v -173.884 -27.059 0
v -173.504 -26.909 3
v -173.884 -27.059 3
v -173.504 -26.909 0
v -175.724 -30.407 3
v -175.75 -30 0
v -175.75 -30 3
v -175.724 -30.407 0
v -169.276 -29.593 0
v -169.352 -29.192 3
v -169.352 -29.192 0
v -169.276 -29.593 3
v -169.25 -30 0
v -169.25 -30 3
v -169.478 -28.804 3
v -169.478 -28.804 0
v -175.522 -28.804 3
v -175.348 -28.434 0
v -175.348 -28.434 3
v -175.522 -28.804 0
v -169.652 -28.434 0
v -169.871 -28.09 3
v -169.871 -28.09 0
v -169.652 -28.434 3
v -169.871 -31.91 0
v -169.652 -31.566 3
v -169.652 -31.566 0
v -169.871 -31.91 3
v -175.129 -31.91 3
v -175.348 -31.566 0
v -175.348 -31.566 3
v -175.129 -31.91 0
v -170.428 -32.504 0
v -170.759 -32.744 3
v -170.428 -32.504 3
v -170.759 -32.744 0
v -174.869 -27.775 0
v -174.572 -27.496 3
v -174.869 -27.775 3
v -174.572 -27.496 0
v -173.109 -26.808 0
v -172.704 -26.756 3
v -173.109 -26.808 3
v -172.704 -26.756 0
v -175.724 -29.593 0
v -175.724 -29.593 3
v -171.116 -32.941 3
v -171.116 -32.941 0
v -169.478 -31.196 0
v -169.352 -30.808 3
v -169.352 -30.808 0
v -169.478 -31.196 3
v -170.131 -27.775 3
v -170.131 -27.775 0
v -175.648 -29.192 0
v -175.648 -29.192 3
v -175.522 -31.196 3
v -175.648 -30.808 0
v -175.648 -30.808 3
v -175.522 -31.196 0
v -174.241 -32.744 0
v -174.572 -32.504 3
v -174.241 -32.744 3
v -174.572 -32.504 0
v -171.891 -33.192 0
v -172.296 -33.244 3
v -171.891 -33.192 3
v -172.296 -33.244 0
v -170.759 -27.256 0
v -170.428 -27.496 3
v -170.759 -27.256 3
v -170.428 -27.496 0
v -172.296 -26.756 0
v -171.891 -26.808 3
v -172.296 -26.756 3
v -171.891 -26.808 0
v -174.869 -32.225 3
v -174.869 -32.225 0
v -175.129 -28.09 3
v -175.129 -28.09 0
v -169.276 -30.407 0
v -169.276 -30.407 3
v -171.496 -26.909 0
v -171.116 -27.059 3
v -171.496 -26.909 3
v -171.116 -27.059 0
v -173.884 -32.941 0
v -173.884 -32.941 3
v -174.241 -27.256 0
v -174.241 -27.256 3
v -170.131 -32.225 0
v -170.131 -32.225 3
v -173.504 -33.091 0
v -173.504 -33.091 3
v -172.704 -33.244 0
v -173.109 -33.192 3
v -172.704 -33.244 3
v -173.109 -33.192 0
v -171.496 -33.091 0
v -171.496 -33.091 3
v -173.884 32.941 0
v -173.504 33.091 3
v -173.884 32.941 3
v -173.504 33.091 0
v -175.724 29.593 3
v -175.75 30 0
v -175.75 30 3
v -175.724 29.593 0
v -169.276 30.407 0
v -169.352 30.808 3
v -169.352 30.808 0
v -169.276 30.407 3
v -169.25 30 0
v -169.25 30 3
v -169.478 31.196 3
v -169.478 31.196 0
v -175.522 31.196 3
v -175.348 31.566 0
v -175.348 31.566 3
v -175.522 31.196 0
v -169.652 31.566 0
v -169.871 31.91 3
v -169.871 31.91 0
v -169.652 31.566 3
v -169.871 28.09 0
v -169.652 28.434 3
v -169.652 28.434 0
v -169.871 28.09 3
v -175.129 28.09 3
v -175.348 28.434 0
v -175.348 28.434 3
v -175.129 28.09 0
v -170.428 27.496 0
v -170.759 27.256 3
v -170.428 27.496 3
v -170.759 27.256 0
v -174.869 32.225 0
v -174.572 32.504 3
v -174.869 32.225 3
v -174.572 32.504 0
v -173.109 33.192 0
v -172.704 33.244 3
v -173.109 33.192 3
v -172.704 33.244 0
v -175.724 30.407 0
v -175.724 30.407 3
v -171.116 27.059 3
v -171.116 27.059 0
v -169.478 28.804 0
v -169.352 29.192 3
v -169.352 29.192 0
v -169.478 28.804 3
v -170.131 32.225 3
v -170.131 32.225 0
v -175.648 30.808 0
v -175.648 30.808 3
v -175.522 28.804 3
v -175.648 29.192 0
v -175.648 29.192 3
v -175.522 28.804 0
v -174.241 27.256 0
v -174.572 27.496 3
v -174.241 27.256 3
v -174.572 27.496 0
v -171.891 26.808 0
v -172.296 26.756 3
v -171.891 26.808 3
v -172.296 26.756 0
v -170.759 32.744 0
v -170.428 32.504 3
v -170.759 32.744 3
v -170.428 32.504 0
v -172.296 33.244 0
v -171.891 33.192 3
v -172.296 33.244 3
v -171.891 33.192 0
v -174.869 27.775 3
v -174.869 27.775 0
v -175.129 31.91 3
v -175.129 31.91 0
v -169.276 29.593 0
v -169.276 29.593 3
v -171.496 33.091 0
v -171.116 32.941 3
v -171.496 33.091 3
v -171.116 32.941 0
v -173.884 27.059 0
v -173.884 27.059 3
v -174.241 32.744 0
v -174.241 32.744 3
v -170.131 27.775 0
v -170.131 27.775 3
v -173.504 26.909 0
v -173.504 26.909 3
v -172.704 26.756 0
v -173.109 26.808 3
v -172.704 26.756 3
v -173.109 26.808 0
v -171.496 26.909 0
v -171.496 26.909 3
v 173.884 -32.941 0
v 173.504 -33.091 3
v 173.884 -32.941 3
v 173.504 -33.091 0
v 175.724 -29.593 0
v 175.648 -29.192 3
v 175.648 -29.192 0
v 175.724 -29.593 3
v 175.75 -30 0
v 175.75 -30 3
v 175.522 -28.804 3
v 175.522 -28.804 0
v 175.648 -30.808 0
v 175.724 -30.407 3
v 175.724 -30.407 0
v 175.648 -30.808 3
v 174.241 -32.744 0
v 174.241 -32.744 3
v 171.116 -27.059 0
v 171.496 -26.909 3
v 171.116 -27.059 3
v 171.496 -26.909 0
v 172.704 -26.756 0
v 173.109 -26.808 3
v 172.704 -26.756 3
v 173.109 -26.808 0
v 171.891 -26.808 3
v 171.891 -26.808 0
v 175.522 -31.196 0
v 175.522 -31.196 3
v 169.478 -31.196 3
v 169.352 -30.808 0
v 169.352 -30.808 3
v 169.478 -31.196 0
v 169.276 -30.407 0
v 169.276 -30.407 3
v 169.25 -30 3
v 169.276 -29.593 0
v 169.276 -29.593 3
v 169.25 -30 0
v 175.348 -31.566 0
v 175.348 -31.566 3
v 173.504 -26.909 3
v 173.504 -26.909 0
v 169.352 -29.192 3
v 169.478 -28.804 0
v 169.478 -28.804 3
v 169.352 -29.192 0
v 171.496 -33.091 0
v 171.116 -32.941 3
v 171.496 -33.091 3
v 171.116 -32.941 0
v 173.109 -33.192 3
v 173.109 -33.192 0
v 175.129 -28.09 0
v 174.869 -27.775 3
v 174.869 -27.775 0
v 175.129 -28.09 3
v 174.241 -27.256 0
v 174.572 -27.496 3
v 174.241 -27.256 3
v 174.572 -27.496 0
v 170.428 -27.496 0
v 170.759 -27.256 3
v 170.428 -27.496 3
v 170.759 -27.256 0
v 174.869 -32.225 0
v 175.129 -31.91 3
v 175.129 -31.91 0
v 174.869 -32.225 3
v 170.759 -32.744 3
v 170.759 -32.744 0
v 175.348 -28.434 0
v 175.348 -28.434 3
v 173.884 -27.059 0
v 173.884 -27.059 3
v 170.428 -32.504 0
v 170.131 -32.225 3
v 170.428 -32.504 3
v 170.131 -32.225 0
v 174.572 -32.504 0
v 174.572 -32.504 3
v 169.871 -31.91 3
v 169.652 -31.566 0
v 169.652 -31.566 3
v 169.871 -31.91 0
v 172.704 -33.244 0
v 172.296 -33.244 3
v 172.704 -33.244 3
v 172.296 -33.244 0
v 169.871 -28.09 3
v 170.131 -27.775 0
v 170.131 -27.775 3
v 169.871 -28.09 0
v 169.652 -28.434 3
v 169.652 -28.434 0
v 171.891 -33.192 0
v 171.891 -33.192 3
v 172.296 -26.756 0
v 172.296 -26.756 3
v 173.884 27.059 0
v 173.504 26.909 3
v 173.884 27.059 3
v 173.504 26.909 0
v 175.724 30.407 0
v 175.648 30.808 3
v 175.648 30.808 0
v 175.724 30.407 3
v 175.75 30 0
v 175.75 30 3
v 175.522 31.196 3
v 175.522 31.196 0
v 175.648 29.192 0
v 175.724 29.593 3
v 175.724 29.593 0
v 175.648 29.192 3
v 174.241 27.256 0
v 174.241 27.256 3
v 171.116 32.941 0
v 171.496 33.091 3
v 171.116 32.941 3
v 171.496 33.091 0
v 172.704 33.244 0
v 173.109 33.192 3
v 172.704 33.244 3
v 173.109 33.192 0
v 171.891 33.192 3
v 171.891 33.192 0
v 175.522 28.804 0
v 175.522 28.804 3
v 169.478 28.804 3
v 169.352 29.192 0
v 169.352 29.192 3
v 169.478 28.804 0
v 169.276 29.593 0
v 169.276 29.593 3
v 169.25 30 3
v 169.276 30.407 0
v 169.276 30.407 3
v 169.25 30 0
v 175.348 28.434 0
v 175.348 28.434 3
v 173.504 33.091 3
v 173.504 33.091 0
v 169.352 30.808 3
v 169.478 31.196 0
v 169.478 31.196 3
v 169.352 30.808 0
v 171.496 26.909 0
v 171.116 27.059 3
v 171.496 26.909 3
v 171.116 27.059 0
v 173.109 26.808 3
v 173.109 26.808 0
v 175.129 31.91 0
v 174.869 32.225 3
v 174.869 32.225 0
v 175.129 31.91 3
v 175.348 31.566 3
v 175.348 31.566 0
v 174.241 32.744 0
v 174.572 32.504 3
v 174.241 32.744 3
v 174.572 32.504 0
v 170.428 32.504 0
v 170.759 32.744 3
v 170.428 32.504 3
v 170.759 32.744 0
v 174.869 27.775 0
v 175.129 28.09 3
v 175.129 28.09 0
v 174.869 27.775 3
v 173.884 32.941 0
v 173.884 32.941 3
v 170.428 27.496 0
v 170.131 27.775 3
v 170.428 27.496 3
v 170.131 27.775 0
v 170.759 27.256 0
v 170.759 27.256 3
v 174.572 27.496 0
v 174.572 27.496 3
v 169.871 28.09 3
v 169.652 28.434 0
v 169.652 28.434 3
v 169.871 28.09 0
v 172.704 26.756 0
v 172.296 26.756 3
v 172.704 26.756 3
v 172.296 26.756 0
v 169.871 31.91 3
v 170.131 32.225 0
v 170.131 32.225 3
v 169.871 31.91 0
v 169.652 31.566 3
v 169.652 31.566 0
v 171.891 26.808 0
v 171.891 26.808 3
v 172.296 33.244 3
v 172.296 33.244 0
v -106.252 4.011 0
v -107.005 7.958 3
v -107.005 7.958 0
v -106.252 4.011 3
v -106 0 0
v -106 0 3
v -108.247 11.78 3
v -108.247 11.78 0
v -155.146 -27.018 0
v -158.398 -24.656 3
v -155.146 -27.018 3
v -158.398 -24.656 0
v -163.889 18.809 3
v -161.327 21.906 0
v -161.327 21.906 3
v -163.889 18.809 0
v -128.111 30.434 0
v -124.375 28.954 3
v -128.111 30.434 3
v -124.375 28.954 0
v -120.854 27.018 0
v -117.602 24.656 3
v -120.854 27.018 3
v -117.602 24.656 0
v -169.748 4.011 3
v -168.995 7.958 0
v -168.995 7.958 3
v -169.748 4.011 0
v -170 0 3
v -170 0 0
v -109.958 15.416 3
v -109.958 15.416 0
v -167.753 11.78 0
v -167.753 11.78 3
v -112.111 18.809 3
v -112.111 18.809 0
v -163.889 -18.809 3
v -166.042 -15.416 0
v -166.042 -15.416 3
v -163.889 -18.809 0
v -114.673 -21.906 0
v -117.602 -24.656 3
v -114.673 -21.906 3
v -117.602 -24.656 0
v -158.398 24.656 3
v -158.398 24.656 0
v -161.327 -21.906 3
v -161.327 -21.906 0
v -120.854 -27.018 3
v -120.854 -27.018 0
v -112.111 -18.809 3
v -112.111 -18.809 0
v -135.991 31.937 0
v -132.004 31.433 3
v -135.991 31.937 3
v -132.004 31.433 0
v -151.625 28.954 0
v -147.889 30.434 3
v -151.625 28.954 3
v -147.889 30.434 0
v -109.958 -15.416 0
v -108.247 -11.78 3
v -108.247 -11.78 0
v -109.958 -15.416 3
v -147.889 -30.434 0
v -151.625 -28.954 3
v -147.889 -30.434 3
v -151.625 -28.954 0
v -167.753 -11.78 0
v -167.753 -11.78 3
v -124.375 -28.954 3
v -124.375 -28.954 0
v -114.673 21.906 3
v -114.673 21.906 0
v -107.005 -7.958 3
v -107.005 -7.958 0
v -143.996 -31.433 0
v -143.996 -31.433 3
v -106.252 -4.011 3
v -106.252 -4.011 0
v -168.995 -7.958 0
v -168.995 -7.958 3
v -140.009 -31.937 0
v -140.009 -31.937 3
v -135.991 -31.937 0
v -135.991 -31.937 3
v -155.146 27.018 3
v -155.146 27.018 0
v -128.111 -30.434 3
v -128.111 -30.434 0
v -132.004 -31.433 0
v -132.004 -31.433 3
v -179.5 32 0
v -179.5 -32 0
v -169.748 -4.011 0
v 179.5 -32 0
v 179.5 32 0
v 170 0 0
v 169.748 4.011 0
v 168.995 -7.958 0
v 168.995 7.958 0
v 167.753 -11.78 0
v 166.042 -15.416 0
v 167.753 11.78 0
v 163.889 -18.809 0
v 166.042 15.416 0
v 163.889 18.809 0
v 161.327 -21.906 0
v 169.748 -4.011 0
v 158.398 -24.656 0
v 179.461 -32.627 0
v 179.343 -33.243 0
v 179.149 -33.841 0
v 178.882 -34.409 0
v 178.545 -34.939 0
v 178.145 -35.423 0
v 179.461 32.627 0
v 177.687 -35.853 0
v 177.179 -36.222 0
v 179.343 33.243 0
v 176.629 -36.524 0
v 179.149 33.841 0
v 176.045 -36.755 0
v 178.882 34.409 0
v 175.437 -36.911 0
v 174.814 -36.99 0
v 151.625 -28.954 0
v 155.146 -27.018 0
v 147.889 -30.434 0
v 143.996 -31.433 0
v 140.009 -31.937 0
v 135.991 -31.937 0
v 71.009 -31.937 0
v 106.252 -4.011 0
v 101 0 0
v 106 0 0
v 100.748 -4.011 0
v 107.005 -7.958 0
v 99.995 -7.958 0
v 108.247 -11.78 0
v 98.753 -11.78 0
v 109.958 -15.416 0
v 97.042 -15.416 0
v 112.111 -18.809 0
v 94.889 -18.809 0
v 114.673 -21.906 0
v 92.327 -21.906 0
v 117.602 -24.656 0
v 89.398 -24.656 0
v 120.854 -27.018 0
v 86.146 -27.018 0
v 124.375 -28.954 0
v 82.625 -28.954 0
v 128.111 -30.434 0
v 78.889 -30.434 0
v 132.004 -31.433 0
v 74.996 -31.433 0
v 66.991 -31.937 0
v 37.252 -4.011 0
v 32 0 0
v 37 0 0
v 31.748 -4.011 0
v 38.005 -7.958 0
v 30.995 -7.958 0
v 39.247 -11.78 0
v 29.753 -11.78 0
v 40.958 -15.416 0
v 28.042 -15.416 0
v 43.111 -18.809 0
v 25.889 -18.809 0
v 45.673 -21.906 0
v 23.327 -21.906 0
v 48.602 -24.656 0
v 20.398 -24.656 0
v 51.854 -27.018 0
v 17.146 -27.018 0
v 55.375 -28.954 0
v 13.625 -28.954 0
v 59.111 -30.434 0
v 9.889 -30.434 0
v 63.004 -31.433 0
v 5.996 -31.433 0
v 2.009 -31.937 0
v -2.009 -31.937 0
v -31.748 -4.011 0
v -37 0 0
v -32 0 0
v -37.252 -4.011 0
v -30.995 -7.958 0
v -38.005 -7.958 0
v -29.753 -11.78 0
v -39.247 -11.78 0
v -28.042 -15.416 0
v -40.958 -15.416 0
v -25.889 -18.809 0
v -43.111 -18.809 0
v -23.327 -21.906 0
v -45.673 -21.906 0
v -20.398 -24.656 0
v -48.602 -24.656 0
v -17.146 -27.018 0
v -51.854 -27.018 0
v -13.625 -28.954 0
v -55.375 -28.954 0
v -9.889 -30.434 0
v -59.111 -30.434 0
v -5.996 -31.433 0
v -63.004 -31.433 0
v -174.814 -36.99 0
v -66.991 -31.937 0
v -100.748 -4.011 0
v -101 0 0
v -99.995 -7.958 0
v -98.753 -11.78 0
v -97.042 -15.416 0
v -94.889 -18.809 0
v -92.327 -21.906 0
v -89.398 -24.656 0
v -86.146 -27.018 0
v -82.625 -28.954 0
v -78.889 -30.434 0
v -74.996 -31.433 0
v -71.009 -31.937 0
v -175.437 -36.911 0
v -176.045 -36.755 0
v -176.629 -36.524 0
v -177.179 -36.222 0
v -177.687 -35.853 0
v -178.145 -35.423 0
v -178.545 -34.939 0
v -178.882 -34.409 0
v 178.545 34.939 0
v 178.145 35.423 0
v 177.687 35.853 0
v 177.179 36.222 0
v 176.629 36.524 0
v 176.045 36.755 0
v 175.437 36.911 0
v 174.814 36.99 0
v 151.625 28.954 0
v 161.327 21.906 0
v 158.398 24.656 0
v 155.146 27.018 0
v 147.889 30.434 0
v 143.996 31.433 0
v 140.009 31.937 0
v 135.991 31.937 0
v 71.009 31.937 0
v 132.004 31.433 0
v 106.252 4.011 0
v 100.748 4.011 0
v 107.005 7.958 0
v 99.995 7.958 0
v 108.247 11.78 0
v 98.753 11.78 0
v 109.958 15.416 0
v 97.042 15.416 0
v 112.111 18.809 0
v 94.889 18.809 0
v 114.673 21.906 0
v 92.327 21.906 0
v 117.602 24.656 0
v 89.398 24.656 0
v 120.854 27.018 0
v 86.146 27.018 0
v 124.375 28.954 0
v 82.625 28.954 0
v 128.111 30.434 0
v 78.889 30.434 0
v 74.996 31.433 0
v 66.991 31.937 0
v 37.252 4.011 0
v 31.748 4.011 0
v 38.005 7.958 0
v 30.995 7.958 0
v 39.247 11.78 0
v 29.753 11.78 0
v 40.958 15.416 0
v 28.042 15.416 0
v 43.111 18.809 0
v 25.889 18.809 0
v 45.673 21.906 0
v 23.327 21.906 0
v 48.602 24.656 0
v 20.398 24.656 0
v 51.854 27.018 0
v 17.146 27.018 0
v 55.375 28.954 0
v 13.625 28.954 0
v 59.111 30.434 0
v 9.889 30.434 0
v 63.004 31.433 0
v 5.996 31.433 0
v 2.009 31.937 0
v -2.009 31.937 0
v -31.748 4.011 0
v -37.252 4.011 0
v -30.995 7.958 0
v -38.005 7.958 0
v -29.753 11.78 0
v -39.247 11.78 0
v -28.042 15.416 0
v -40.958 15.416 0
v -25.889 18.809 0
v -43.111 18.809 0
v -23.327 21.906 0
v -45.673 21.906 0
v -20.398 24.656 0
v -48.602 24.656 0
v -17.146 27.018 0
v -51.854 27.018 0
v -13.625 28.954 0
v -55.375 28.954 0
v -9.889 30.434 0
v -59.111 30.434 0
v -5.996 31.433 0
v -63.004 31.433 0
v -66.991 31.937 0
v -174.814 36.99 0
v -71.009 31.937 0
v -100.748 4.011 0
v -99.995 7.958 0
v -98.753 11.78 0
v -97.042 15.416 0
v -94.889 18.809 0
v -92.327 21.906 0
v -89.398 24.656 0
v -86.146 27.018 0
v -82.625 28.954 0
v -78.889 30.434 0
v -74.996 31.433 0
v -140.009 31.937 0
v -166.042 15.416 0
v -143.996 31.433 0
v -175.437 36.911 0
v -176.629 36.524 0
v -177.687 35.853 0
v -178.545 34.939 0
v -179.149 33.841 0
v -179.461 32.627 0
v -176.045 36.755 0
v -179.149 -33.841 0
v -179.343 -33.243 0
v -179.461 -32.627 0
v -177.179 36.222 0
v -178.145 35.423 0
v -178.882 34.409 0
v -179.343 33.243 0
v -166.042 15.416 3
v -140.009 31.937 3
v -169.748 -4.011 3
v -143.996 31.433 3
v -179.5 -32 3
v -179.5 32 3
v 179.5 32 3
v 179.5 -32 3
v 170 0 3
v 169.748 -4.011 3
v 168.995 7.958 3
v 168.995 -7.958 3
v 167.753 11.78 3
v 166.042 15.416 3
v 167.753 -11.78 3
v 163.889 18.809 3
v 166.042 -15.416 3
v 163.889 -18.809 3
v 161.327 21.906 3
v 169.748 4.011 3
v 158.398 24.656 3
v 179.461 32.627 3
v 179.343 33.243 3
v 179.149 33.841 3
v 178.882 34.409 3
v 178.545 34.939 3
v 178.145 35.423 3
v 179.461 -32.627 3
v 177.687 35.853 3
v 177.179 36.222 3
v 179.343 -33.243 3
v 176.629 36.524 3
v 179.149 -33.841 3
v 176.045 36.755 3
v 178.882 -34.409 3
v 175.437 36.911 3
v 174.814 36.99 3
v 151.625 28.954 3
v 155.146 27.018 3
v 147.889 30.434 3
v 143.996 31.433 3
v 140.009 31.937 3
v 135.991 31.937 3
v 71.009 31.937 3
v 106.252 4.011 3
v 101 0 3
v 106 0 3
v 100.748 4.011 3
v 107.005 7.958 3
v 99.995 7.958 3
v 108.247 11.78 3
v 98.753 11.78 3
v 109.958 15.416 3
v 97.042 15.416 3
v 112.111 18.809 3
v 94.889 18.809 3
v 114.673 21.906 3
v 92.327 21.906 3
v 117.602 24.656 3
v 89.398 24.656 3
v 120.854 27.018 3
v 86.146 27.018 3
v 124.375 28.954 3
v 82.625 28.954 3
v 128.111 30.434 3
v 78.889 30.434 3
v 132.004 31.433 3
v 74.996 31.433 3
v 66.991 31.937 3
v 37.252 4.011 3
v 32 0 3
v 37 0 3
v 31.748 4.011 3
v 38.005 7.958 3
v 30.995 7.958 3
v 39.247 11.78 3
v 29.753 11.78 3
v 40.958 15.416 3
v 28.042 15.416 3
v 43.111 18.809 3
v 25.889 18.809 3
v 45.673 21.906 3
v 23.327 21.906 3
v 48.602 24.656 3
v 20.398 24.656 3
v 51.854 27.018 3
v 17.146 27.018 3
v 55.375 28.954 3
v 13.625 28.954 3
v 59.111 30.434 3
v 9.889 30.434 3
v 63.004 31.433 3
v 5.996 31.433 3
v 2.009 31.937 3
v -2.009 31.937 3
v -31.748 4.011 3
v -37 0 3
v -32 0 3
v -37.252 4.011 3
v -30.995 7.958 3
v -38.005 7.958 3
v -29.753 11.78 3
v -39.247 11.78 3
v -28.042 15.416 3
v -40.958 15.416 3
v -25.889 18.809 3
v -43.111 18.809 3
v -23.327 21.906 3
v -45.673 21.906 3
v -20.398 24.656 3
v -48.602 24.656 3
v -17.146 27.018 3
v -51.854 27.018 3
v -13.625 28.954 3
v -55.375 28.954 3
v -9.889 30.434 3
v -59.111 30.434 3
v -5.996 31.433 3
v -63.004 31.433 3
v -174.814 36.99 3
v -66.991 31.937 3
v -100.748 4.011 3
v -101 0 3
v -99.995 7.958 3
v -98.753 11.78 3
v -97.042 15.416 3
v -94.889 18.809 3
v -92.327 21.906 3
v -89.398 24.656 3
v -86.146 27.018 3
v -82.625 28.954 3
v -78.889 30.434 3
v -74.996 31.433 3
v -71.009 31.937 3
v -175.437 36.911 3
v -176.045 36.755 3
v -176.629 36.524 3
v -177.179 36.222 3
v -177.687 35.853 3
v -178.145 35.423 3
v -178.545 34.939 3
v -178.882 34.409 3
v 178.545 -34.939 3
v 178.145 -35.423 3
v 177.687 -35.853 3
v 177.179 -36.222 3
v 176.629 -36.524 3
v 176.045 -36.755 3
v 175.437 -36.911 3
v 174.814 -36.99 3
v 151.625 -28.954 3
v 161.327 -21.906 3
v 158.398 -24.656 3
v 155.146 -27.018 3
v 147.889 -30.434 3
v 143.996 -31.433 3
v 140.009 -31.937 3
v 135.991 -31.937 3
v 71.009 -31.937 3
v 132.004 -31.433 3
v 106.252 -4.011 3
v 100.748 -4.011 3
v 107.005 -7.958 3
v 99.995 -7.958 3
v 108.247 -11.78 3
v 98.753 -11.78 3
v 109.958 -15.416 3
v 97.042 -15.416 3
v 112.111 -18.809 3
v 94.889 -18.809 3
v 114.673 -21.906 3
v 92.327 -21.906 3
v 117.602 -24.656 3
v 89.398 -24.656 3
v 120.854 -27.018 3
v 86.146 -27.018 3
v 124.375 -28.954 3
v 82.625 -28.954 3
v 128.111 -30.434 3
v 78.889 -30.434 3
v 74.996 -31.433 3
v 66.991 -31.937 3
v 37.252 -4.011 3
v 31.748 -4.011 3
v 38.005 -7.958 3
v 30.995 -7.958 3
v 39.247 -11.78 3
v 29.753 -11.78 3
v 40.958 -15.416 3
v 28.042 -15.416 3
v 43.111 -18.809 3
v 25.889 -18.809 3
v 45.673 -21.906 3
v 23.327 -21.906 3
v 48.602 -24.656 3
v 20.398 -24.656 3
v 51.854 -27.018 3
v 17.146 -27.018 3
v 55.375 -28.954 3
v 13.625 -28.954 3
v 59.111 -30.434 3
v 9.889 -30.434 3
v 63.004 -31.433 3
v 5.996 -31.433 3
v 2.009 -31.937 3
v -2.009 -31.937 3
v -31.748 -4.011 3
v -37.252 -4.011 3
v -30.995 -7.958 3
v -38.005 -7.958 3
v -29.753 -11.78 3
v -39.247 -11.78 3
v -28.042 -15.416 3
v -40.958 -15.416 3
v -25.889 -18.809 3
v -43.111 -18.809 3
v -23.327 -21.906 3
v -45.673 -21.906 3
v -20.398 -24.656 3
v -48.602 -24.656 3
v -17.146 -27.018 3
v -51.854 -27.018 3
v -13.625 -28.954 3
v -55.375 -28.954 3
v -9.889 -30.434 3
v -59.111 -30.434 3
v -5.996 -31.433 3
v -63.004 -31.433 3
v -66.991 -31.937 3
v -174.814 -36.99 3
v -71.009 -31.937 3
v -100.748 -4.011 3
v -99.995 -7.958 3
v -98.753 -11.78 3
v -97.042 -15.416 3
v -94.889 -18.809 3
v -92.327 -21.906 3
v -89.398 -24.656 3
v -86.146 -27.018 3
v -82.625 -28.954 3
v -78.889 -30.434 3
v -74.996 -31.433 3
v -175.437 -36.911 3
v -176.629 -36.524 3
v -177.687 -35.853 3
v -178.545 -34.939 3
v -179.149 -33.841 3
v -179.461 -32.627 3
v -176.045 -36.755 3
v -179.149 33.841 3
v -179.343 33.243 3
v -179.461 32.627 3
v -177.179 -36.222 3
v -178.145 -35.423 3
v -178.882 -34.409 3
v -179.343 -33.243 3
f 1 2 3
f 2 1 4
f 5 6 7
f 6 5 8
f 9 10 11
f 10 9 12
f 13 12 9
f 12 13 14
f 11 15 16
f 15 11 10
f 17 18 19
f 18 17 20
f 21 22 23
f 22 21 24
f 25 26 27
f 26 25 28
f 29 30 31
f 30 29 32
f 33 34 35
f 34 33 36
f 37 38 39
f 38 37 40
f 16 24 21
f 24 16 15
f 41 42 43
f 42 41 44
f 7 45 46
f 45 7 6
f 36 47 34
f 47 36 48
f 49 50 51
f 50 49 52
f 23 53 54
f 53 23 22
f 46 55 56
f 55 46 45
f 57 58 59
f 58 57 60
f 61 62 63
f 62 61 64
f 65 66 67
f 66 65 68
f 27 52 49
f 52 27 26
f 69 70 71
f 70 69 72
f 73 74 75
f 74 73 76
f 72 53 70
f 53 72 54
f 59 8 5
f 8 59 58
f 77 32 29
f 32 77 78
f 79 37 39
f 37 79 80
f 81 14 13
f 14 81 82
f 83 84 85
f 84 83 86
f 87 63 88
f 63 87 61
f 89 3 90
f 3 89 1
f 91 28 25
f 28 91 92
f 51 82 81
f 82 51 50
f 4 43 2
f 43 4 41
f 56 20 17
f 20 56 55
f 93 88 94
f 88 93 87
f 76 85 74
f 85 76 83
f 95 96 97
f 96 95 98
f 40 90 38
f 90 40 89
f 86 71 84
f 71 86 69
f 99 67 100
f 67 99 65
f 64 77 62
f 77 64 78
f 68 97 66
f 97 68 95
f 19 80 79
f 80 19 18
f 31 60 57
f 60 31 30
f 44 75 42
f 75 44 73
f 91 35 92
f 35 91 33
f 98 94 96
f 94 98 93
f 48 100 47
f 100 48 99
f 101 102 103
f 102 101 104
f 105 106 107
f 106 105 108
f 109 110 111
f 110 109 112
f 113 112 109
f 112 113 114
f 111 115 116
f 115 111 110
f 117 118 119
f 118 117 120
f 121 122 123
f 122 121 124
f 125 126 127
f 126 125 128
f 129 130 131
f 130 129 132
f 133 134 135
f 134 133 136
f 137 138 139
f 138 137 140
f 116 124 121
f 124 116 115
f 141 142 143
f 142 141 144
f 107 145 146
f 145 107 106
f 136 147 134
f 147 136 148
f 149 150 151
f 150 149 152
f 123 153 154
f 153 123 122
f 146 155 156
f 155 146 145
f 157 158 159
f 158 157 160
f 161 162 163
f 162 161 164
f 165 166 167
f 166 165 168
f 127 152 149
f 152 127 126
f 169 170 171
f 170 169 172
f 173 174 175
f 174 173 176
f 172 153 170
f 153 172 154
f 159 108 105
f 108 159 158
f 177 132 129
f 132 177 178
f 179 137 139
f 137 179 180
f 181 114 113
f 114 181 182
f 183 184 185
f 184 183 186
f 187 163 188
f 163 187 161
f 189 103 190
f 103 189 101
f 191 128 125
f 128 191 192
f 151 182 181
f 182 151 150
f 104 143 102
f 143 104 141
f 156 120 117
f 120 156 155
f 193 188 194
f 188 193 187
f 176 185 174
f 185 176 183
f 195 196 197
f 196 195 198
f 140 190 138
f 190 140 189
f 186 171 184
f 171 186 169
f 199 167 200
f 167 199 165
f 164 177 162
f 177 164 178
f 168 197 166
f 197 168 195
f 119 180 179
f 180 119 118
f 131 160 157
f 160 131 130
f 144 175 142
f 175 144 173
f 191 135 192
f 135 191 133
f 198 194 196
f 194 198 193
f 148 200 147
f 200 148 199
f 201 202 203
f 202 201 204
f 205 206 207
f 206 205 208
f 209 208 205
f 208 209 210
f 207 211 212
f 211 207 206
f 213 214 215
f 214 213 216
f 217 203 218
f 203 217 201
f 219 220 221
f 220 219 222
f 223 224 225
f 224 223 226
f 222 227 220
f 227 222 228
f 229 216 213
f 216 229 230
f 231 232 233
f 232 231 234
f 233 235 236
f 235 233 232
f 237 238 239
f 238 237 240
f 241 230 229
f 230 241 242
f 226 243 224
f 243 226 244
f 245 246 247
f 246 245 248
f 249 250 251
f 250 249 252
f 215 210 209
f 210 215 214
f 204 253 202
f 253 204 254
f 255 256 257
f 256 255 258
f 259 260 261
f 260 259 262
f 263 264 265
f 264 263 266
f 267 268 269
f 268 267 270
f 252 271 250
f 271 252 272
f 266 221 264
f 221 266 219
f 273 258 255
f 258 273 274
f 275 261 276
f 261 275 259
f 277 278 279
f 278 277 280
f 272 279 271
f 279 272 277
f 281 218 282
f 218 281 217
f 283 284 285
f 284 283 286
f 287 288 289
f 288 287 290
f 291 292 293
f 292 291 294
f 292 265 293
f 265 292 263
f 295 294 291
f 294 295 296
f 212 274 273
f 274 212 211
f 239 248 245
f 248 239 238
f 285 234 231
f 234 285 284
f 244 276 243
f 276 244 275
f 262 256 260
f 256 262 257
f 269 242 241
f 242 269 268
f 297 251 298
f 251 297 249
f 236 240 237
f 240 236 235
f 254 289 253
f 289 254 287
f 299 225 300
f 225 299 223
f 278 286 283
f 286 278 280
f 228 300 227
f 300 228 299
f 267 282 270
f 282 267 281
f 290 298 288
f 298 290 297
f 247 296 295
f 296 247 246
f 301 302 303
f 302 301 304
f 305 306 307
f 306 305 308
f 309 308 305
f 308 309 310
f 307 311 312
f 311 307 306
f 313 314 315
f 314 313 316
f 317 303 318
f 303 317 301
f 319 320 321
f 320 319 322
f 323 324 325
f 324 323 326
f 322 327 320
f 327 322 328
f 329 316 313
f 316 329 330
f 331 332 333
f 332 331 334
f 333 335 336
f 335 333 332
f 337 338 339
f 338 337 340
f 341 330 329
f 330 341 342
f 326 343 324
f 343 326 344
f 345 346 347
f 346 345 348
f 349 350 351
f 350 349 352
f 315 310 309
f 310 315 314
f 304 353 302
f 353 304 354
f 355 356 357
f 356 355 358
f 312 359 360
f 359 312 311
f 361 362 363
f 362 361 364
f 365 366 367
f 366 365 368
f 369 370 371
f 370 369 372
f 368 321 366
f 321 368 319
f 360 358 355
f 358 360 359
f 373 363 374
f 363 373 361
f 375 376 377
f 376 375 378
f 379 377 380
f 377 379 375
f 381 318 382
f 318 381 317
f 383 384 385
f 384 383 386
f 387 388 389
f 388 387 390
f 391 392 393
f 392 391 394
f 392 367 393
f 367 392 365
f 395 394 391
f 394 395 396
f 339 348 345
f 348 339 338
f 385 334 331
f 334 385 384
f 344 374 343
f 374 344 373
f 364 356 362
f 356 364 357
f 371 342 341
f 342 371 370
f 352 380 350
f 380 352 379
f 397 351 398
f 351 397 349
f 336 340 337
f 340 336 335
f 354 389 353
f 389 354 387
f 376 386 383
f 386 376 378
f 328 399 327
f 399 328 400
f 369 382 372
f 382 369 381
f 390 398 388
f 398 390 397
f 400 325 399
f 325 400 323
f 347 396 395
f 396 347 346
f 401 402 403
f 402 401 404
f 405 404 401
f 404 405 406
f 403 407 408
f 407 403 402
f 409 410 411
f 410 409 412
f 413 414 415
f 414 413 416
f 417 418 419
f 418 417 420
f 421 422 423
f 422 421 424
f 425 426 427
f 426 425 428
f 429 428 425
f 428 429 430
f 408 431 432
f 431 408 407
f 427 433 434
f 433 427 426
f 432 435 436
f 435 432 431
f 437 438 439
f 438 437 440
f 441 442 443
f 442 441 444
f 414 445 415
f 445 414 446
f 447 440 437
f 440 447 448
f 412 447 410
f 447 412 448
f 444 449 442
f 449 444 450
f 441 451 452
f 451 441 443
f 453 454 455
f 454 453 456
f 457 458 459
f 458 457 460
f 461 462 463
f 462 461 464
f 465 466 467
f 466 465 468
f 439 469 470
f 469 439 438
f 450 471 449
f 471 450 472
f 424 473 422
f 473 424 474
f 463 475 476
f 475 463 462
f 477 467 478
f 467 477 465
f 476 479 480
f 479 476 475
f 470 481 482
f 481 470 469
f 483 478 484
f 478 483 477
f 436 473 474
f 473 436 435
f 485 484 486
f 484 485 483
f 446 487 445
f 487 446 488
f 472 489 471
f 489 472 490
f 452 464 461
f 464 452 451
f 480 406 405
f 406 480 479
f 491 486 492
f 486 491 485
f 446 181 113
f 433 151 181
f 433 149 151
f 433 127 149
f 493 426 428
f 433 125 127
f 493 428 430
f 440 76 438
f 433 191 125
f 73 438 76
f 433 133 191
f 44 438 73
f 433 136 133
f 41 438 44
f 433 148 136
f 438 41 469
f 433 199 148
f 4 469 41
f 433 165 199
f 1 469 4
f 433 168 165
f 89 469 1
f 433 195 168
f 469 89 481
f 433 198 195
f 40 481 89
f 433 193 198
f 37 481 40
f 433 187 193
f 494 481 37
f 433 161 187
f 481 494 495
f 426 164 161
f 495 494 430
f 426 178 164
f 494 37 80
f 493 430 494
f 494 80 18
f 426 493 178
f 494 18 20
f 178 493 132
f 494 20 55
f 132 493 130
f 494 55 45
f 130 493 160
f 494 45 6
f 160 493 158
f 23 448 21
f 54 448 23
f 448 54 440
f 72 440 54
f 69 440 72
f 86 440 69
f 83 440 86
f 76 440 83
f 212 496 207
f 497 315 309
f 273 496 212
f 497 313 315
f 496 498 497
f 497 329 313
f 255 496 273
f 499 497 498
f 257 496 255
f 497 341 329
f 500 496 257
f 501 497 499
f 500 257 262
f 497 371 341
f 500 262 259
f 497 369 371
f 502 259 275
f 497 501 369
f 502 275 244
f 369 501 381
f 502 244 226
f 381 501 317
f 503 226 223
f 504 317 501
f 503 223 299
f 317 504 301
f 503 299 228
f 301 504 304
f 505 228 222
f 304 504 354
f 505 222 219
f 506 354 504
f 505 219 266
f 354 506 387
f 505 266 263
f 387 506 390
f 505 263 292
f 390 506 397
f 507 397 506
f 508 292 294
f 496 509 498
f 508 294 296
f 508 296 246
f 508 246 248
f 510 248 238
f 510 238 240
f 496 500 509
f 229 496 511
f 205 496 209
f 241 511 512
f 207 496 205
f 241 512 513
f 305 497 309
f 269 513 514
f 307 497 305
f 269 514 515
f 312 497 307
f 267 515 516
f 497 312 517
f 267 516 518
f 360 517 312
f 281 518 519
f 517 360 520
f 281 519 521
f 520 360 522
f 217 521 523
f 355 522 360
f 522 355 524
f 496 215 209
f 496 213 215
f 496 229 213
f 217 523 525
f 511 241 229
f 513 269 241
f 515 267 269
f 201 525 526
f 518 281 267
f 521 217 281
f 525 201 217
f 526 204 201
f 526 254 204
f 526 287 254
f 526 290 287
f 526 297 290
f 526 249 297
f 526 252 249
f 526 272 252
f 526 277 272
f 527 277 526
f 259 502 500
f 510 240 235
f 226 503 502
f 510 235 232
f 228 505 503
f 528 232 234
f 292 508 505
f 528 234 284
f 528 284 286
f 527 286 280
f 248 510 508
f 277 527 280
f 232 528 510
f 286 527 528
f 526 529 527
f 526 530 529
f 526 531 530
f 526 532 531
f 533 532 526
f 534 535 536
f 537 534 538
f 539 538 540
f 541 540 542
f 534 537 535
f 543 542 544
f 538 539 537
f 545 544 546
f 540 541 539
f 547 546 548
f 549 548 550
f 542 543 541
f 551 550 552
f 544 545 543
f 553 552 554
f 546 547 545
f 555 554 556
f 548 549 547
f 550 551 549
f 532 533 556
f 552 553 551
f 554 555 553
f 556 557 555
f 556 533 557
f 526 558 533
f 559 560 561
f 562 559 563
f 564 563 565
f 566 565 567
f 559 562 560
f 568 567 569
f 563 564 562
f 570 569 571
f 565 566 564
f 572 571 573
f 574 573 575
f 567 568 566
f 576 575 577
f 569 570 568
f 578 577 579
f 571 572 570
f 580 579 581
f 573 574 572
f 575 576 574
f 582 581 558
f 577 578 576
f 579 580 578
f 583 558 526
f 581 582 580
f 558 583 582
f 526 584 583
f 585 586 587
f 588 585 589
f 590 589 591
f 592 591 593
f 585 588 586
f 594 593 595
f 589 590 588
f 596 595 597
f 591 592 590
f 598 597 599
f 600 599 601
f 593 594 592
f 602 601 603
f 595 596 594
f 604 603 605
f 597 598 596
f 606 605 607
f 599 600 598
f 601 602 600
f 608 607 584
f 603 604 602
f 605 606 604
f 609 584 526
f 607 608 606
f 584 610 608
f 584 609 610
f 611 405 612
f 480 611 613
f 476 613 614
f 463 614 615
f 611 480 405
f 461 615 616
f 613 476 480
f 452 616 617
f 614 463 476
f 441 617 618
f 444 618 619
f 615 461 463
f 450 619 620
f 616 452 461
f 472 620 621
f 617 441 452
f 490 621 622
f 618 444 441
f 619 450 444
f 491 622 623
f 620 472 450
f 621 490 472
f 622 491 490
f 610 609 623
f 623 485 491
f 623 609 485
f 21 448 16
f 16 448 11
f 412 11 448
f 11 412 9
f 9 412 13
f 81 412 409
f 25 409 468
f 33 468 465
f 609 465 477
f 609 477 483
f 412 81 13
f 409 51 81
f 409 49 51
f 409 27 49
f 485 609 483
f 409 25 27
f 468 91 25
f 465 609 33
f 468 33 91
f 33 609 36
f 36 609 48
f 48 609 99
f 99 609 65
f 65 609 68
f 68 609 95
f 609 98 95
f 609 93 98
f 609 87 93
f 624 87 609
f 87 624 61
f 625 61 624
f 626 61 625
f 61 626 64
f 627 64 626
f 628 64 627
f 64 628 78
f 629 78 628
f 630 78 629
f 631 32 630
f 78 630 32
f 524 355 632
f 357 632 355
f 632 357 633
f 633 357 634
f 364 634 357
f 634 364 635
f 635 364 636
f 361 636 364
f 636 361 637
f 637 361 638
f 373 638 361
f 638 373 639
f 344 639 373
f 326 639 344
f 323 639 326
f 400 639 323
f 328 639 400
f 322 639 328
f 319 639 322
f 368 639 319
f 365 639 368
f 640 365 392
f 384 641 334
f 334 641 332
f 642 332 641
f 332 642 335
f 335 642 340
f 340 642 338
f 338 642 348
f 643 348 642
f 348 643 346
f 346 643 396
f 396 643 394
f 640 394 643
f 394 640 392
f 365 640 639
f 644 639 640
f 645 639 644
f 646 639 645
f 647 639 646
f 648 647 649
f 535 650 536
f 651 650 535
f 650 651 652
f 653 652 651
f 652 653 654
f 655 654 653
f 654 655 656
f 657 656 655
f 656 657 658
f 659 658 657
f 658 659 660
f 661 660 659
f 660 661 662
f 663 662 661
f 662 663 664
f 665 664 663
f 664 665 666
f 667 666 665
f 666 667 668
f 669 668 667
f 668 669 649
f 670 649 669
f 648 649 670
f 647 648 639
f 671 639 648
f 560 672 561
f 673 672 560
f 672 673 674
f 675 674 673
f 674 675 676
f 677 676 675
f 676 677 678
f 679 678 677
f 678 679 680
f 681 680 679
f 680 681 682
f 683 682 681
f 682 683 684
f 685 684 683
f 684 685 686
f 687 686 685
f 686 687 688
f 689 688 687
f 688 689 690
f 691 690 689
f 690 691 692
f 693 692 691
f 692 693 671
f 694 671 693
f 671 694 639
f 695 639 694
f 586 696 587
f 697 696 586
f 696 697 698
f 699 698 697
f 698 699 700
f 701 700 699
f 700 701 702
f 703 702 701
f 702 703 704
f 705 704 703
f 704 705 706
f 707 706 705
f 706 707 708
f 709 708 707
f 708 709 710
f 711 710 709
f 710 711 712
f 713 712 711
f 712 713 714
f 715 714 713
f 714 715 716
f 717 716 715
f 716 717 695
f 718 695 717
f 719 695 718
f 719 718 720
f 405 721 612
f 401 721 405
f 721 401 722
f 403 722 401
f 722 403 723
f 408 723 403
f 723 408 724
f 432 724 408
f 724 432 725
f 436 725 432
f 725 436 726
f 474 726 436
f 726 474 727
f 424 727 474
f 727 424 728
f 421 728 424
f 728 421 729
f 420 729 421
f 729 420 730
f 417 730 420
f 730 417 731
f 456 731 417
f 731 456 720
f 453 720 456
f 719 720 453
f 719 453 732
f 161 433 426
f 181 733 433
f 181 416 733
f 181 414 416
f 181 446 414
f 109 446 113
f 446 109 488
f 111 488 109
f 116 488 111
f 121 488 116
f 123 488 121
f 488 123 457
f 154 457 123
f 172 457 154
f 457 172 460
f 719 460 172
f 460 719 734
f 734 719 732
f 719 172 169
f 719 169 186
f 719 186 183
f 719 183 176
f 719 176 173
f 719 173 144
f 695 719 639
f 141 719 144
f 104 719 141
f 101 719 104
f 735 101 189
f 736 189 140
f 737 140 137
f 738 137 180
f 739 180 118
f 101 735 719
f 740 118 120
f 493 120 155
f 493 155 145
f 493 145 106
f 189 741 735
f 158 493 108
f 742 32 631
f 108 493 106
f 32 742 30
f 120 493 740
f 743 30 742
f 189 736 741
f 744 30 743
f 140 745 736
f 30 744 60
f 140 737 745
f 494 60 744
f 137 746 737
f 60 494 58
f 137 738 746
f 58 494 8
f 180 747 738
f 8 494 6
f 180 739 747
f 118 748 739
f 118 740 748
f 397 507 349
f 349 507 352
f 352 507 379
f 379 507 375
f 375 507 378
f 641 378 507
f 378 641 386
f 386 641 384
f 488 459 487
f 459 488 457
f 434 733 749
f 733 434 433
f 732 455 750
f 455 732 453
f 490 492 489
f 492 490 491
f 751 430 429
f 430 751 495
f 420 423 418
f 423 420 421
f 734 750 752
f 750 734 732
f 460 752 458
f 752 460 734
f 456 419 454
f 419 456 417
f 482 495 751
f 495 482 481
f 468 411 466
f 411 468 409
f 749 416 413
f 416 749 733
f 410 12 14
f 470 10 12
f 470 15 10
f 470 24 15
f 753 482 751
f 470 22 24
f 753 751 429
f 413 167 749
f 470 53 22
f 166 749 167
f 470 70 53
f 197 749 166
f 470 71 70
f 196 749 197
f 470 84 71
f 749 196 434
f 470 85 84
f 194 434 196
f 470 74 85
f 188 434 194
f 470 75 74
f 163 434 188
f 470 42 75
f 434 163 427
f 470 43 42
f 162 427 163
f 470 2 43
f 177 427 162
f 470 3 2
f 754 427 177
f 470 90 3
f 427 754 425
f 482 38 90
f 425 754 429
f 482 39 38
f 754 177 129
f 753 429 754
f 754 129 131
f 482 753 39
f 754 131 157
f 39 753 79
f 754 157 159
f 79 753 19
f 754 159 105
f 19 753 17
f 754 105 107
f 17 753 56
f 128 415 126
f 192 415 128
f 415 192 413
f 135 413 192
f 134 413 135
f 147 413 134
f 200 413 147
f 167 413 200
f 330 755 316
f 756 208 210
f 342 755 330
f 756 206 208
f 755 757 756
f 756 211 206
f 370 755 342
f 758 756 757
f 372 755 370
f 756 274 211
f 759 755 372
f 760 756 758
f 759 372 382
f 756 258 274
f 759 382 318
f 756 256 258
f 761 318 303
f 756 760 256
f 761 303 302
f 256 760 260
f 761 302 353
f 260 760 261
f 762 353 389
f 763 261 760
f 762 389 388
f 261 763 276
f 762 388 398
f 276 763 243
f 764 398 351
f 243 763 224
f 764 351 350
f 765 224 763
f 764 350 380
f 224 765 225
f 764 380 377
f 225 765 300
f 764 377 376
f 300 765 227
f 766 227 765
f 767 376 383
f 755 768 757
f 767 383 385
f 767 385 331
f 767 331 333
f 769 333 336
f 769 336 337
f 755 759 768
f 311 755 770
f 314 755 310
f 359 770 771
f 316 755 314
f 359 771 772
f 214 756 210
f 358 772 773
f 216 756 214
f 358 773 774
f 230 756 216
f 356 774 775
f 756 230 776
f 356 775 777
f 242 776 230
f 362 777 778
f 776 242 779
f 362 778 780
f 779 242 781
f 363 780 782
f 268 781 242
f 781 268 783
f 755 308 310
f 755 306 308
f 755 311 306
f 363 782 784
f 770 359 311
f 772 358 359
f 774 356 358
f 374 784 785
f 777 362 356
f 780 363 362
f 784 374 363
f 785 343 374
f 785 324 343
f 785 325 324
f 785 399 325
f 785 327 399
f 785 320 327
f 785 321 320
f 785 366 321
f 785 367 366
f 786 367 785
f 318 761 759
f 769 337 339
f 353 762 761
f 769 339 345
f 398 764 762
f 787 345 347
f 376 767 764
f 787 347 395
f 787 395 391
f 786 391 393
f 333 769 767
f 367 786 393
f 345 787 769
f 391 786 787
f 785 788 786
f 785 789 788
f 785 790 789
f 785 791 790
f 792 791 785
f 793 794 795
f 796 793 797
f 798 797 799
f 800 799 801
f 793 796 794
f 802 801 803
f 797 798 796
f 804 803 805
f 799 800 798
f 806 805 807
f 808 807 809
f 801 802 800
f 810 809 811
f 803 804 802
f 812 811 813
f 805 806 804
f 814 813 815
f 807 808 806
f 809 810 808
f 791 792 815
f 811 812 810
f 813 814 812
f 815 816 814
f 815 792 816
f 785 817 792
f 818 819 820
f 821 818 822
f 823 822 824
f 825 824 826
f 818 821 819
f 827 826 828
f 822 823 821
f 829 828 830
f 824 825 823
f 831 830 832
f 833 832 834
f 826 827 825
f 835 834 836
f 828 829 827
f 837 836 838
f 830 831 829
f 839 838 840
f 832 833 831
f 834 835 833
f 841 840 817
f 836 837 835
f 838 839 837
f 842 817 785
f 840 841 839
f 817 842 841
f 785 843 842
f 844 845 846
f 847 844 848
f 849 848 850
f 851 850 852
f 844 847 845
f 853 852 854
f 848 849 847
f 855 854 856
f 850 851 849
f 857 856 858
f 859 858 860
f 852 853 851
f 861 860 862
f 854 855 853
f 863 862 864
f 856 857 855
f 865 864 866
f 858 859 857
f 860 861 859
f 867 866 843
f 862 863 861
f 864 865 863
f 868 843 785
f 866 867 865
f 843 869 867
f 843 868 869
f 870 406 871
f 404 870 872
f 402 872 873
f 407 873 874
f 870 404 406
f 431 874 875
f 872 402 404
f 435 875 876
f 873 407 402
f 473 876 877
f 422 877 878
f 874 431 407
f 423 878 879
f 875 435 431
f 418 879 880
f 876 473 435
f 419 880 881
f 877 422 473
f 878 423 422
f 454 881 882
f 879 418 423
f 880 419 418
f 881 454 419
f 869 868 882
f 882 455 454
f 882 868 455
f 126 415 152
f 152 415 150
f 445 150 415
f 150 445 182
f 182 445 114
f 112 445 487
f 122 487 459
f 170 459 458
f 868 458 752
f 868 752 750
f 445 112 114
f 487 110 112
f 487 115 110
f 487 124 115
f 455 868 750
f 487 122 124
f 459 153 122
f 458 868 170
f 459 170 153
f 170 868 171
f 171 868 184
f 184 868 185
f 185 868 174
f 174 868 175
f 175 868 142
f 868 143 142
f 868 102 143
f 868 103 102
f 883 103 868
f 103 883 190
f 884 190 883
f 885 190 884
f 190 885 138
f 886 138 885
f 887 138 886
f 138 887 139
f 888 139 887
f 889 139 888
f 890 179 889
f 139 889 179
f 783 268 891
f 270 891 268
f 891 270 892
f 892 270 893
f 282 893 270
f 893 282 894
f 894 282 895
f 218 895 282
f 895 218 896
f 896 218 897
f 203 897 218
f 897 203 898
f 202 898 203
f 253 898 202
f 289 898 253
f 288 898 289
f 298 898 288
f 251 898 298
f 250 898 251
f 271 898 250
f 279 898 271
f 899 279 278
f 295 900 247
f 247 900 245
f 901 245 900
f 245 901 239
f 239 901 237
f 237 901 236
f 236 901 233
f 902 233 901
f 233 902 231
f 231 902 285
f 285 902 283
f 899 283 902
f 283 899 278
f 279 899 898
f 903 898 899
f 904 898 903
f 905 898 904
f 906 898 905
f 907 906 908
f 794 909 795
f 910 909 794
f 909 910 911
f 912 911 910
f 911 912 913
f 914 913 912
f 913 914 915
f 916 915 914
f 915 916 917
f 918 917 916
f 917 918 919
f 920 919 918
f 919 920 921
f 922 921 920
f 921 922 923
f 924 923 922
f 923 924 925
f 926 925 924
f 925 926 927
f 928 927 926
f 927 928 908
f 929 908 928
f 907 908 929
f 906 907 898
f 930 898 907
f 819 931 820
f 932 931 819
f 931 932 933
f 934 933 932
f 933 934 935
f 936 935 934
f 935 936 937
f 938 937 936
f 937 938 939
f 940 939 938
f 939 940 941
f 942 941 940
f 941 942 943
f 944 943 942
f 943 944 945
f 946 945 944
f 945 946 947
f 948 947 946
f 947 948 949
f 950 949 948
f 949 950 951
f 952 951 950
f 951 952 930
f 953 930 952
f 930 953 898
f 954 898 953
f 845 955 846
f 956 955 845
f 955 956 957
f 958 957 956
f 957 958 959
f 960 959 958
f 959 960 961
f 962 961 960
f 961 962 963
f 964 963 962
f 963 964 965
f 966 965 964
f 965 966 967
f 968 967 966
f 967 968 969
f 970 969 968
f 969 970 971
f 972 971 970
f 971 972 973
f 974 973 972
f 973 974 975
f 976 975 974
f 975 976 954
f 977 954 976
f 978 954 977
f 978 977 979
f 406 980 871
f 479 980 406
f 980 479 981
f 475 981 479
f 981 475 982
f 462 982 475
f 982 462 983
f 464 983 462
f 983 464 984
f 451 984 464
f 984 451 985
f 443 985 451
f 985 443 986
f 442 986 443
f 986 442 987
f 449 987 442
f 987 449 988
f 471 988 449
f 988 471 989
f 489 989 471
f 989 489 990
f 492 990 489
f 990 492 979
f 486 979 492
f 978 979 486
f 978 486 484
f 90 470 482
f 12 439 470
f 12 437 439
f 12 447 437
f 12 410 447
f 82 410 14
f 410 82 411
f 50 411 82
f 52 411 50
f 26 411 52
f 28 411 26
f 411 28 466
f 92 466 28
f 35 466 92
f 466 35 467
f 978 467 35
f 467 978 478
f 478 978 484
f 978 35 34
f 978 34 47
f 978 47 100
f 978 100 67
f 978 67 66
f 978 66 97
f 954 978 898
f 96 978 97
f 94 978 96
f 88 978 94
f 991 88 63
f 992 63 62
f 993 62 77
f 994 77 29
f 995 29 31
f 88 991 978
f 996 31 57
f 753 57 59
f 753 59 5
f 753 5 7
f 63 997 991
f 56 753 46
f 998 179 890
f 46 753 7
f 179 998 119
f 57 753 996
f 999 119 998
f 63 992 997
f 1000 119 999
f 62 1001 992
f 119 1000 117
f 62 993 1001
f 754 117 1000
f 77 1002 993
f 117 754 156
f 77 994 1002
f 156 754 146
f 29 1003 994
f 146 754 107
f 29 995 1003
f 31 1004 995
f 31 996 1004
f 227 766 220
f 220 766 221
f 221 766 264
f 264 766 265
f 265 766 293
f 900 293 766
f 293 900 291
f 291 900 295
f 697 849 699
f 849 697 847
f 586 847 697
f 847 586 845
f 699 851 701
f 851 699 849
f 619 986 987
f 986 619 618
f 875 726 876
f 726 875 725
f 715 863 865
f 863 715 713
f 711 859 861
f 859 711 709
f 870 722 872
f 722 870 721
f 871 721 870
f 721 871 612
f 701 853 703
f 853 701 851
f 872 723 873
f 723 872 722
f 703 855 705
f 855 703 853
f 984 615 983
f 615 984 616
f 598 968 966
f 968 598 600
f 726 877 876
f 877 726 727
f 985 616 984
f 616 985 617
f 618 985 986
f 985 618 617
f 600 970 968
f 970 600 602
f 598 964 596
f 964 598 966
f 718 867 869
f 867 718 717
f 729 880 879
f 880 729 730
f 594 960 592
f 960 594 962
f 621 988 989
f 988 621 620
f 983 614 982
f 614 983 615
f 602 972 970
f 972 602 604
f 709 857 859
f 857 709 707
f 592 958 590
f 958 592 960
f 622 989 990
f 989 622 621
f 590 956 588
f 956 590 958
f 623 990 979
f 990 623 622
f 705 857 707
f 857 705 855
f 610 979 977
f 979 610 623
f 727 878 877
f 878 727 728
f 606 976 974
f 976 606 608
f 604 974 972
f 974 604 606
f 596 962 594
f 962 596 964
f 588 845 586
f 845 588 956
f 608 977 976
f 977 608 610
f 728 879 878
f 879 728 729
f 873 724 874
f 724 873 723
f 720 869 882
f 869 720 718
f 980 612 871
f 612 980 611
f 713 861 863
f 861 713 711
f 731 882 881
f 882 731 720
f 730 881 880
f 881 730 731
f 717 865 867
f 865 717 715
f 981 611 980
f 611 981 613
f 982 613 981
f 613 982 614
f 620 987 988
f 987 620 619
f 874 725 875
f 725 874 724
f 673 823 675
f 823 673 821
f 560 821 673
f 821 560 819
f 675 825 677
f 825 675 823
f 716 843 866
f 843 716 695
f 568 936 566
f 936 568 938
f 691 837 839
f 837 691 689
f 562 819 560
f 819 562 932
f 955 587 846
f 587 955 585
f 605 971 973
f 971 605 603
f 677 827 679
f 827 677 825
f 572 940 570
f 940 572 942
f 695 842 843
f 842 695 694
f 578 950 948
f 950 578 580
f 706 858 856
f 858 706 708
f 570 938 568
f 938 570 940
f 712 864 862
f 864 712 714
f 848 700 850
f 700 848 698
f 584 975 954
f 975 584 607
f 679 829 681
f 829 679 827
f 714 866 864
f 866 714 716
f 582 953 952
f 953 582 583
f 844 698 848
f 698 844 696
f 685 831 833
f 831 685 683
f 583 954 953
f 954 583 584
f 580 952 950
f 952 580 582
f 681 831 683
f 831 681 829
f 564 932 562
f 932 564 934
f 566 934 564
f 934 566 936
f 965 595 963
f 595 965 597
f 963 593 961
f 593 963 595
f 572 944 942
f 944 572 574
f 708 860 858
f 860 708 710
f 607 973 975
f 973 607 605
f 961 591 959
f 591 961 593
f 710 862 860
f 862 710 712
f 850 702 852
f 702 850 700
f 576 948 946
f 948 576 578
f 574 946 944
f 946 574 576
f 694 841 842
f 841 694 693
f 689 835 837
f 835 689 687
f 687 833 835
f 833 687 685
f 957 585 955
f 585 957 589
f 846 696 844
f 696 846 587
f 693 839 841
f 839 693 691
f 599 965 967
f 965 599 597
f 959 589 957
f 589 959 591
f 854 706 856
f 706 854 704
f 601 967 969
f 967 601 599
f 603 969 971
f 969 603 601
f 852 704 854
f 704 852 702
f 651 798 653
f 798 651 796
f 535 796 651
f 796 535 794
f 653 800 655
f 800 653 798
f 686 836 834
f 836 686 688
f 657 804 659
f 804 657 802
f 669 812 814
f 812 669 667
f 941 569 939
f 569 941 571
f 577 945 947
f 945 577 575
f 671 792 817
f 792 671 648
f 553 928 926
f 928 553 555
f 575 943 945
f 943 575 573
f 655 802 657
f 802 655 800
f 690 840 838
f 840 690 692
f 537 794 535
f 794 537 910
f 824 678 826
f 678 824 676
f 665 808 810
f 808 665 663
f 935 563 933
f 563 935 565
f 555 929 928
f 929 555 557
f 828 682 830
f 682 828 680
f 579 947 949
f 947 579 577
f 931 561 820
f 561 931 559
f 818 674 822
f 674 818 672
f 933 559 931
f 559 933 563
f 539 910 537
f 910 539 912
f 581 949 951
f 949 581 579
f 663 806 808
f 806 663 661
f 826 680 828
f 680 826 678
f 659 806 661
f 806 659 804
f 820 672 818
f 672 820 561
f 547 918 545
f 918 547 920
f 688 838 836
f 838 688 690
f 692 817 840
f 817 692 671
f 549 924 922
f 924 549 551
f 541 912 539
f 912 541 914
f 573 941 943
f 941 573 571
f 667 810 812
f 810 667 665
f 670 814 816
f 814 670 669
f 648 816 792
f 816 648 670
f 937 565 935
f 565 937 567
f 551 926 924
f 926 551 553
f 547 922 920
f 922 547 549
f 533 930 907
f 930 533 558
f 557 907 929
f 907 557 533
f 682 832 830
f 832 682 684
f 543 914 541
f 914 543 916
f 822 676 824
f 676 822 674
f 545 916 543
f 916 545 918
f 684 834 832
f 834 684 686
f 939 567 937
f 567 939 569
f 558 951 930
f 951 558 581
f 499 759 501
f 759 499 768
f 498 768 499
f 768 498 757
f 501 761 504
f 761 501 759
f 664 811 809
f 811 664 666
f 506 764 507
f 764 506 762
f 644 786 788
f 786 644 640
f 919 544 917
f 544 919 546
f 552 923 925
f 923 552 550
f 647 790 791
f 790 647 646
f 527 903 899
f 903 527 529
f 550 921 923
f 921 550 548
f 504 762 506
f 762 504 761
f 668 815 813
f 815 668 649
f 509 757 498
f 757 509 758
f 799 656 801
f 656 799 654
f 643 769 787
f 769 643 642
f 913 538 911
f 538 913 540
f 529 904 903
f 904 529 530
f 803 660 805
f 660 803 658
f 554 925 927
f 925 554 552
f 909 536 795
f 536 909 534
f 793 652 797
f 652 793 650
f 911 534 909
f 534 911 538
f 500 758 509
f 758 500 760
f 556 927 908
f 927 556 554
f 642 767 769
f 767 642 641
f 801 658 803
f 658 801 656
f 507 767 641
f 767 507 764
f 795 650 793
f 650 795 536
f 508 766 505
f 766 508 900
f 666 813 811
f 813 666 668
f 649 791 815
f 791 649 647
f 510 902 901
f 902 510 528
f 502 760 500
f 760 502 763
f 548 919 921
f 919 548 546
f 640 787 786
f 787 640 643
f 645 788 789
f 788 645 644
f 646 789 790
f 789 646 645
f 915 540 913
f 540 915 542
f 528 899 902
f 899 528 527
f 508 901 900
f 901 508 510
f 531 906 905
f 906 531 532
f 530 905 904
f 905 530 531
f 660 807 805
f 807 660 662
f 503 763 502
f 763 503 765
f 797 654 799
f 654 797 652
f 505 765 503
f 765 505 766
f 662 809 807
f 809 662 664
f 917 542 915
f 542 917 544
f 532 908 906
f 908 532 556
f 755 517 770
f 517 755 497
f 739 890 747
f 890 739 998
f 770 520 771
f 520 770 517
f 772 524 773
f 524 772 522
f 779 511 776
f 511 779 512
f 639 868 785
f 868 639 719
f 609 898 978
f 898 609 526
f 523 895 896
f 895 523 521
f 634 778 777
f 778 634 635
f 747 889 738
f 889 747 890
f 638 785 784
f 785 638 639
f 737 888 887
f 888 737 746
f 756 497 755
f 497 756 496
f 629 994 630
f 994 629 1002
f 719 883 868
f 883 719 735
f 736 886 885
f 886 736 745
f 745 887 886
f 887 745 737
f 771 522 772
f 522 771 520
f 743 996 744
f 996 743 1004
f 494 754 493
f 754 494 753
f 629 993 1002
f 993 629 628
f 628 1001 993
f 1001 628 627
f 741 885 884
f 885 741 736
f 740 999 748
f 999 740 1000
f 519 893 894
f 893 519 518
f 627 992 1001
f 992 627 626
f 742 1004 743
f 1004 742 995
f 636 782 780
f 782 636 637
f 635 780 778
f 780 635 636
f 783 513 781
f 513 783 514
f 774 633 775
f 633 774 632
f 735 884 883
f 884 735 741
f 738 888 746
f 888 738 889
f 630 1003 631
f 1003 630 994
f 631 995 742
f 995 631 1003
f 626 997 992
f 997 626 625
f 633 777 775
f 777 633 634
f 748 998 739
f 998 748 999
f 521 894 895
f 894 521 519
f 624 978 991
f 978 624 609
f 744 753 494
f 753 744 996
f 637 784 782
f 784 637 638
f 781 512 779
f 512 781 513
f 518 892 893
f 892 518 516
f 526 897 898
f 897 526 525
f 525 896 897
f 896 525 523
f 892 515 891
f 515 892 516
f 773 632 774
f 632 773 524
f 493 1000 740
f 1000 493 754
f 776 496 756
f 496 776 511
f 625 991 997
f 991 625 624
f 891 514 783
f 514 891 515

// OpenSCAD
$fn = 50;


difference() {
	union() {
		hull() {
			translate(v = [-174.5000000000, 32.0000000000, 0]) {
				cylinder(h = 3, r = 5);
			}
			translate(v = [174.5000000000, 32.0000000000, 0]) {
				cylinder(h = 3, r = 5);
			}
			translate(v = [-174.5000000000, -32.0000000000, 0]) {
				cylinder(h = 3, r = 5);
			}
			translate(v = [174.5000000000, -32.0000000000, 0]) {
				cylinder(h = 3, r = 5);
			}
		}
	}
	union() {
		#translate(v = [-172.5000000000, -30.0000000000, -100.0000000000]) {
			cylinder(h = 200, r = 3.2500000000);
		}
		#translate(v = [-172.5000000000, 30.0000000000, -100.0000000000]) {
			cylinder(h = 200, r = 3.2500000000);
		}
		#translate(v = [172.5000000000, -30.0000000000, -100.0000000000]) {
			cylinder(h = 200, r = 3.2500000000);
		}
		#translate(v = [172.5000000000, 30.0000000000, -100.0000000000]) {
			cylinder(h = 200, r = 3.2500000000);
		}
		#translate(v = [-138.0000000000, 0, 0]) {
			cylinder(h = 3, r = 32.0000000000);
		}
		#translate(v = [-69.0000000000, 0, 0]) {
			cylinder(h = 3, r = 32.0000000000);
		}
		#cylinder(h = 3, r = 32.0000000000);
		#translate(v = [69.0000000000, 0, 0]) {
			cylinder(h = 3, r = 32.0000000000);
		}
		#translate(v = [138.0000000000, 0, 0]) {
			cylinder(h = 3, r = 32.0000000000);
		}
	}
}
